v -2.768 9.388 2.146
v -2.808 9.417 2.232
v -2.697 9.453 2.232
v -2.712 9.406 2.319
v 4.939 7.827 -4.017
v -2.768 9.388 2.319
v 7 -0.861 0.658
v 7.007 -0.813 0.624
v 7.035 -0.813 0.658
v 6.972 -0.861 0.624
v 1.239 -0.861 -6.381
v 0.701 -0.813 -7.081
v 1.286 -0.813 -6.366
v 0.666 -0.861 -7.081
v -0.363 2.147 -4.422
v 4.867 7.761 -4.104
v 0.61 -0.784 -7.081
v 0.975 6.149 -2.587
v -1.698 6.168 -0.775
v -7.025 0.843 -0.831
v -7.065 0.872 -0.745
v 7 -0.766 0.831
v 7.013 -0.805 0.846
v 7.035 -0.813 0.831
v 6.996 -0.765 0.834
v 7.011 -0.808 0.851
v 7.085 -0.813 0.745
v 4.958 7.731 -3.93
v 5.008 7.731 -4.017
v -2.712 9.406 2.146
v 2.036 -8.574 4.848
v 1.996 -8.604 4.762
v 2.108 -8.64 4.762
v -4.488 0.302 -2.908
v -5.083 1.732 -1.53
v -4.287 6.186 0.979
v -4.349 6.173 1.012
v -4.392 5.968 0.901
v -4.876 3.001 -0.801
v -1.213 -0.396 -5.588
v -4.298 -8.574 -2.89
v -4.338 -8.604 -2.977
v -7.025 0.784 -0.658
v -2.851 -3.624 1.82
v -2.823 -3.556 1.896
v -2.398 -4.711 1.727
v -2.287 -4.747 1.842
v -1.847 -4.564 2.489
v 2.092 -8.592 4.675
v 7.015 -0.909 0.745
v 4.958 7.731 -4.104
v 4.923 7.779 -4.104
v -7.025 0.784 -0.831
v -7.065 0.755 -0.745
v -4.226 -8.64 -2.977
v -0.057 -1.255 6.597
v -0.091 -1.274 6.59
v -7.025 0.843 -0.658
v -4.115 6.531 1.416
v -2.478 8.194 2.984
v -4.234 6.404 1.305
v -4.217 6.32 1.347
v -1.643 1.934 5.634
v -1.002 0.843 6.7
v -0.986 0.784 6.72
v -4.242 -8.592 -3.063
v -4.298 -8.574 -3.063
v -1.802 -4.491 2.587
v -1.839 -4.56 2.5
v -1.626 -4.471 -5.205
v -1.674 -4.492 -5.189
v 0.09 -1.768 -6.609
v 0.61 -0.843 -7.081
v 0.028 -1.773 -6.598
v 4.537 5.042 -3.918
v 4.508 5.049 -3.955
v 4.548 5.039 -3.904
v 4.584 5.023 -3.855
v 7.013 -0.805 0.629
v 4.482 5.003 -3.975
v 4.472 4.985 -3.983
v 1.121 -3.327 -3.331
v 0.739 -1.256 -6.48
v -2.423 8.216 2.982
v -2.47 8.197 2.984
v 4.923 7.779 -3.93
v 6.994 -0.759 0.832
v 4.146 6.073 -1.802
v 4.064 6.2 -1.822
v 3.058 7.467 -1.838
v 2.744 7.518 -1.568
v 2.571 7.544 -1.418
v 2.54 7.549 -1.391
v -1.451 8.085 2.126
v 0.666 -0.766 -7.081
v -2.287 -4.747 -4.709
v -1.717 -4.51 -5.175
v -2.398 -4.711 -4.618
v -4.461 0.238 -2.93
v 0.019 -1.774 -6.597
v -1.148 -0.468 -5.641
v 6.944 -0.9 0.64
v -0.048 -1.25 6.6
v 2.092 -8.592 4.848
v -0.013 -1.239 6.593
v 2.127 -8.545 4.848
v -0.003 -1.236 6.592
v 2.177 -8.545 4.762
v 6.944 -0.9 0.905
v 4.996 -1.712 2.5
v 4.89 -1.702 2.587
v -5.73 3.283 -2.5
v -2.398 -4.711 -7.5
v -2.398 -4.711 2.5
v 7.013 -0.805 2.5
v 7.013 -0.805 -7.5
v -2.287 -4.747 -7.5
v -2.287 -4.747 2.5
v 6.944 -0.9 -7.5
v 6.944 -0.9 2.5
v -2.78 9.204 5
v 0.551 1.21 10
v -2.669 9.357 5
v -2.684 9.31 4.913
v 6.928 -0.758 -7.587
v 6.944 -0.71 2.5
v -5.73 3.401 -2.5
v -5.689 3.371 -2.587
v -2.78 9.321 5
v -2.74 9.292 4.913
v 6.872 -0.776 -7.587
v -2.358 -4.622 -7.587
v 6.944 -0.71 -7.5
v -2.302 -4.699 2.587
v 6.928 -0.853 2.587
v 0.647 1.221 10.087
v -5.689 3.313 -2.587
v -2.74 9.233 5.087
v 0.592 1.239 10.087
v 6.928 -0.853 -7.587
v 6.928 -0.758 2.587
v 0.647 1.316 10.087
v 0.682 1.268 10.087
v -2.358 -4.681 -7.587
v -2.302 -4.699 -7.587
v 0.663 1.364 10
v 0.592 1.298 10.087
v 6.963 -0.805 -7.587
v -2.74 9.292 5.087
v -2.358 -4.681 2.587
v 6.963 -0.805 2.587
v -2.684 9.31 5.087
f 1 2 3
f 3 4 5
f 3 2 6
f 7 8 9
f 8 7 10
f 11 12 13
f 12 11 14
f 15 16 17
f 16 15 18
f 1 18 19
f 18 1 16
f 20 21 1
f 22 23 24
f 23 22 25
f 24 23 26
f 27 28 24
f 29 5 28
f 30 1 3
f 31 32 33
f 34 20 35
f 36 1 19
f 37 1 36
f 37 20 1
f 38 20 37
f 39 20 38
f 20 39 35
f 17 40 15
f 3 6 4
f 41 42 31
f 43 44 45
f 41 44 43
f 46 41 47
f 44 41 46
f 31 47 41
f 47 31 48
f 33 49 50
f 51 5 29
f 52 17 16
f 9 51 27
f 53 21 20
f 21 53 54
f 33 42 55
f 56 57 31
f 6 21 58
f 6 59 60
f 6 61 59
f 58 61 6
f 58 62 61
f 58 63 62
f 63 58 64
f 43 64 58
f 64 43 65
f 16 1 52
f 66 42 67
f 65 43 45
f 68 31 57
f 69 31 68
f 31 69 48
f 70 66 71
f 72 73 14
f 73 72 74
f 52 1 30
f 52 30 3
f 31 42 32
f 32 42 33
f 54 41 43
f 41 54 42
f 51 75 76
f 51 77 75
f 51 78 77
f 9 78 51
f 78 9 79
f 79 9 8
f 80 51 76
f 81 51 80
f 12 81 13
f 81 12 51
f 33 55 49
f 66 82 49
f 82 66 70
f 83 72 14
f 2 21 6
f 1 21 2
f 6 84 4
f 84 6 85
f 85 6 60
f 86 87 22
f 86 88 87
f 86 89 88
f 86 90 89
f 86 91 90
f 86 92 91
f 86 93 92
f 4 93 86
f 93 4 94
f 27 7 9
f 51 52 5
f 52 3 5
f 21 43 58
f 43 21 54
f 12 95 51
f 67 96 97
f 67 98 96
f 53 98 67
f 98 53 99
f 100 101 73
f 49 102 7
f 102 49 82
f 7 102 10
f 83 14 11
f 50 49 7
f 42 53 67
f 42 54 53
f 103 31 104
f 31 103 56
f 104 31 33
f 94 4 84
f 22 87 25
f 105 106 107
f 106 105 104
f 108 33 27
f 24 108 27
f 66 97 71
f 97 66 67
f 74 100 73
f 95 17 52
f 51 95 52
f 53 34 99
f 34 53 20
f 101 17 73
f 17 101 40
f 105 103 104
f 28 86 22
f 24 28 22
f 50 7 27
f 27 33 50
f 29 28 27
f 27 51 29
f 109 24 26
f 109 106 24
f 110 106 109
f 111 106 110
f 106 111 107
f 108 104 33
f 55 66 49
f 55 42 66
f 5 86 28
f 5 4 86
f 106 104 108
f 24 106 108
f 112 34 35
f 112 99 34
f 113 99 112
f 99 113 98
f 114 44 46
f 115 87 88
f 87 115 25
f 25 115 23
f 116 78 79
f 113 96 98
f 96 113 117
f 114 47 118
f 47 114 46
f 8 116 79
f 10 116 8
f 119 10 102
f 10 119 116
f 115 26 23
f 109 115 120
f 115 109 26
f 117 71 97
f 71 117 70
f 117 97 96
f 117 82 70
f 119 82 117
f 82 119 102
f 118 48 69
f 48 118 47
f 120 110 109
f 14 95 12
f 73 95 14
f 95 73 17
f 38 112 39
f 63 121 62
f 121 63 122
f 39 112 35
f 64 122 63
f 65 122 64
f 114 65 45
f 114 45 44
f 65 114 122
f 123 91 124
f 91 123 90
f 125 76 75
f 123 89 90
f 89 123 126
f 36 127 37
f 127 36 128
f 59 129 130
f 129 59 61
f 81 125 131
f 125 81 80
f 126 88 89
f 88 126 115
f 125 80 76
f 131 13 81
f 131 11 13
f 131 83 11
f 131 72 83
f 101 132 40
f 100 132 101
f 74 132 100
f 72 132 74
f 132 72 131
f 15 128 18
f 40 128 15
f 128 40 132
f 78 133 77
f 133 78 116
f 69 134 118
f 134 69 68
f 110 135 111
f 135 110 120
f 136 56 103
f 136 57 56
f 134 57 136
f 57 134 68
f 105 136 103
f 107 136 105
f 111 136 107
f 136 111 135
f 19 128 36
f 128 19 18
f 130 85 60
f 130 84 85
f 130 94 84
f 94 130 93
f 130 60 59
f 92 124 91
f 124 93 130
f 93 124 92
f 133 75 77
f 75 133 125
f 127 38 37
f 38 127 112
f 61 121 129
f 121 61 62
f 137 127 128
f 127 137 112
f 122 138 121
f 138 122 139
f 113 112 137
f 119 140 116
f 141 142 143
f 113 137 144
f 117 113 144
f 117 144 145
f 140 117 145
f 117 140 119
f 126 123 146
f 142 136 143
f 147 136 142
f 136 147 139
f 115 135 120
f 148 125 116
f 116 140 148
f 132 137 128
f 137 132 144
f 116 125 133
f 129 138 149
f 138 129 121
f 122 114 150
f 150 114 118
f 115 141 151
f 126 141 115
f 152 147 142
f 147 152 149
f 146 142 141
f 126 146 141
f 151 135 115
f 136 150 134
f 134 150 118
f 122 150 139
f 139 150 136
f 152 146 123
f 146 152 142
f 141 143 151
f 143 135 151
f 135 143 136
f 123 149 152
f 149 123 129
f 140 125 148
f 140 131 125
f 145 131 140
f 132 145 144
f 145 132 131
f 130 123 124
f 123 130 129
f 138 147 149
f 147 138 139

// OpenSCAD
// Auto-generated OpenSCAD file

    inner_points = 10*[[0.06319597715687762, 0.1268463153899368, 1.0], [-0.2699443063437531, 0.9262320492567245, 0.5000000000006233], [0.691291687541074, -0.08050791918503769, -0.750000000000228], [-0.2317594497271782, -0.4651851838989617, -0.7500000000003951], [0.6912916875411965, -0.08050791918576636, 0.24999999999977196], [-0.23175944972705564, -0.4651851838996903, 0.24999999999960476], [0.3581514040405658, 0.7188778146810213, -0.24999999999960476], [-0.5648997332276864, 0.33420054996709736, -0.24999999999977196]];

    outer_points = 10*[[-0.4257137914058795, -0.8544883437355262, -0.29768681231614647], [0.20766159975206822, -0.8544883437355262, 0.47615788390882396], [0.490793922669076, 0.7731461234147987, -0.40170436557220773], [-0.27274173101526467, 0.9358305640562536, 0.22323329397953012], [0.06508013126319645, -0.08134222032072741, -0.6993911778883541], [-0.6984555224211442, 0.08134222032072741, -0.07445351833661629], [0.6984555224211442, -0.08134222032072741, 0.07445351833661629], [-0.06508013126319645, 0.08134222032072741, 0.6993911778883541]];

    // Convex hull for inner set (I)
    module inner_hull() {
        hull() {
            for (p = inner_points) {
                translate(p) sphere(r=0.1);
            }
        }
    }

    // Convex hull for outer set (O) minus inner hull (O \ I)
    module outer_minus_inner() {
        difference() {
            hull() {
                for (p = outer_points) {
                    translate(p) sphere(r=0.1);
                }
            }
            inner_hull(); // Subtract inner hull
        }
    }

    // Convex hull for outer set (O) minus all translated inner hulls
    module outer_minus_AllTranslationInner() {
        difference() {
            hull() {
                for (p = outer_points) {
                    translate(p) sphere(r=0.1);
                }
            }
            hull() {
                translate([0,0,50]) inner_hull();
                translate([0,0,-50]) inner_hull();
            }; // Subtract translated inner hulls
        }
    }

    // Difference between outer_minus_inner and outer_minus_AllTranslationInner
    module outer_minus_inner_diff() {
        difference() {
            // Outer minus inner
            difference() {
                hull() {
                    for (p = outer_points) {
                        translate(p) sphere(r=0.1);
                    }
                }
                inner_hull();
            }

            // Subtract Outer minus AllTranslationInner
            difference() {
                hull() {
                    for (p = outer_points) {
                        translate(p) sphere(r=0.1);
                    }
                }
                hull() {
                    translate([0,0,50]) inner_hull();
                    translate([0,0,-50]) inner_hull();
                };
            }
        }
    }

    // Rendering all with colors applied
    color([1, 0, 0, 0.5]) inner_hull(); // Transparent red
    color([0, 1, 0, 1]) outer_minus_AllTranslationInner(); // Opaque green
    color([1, 1, 0, 1]) outer_minus_inner_diff(); // Opaque yellow
    
